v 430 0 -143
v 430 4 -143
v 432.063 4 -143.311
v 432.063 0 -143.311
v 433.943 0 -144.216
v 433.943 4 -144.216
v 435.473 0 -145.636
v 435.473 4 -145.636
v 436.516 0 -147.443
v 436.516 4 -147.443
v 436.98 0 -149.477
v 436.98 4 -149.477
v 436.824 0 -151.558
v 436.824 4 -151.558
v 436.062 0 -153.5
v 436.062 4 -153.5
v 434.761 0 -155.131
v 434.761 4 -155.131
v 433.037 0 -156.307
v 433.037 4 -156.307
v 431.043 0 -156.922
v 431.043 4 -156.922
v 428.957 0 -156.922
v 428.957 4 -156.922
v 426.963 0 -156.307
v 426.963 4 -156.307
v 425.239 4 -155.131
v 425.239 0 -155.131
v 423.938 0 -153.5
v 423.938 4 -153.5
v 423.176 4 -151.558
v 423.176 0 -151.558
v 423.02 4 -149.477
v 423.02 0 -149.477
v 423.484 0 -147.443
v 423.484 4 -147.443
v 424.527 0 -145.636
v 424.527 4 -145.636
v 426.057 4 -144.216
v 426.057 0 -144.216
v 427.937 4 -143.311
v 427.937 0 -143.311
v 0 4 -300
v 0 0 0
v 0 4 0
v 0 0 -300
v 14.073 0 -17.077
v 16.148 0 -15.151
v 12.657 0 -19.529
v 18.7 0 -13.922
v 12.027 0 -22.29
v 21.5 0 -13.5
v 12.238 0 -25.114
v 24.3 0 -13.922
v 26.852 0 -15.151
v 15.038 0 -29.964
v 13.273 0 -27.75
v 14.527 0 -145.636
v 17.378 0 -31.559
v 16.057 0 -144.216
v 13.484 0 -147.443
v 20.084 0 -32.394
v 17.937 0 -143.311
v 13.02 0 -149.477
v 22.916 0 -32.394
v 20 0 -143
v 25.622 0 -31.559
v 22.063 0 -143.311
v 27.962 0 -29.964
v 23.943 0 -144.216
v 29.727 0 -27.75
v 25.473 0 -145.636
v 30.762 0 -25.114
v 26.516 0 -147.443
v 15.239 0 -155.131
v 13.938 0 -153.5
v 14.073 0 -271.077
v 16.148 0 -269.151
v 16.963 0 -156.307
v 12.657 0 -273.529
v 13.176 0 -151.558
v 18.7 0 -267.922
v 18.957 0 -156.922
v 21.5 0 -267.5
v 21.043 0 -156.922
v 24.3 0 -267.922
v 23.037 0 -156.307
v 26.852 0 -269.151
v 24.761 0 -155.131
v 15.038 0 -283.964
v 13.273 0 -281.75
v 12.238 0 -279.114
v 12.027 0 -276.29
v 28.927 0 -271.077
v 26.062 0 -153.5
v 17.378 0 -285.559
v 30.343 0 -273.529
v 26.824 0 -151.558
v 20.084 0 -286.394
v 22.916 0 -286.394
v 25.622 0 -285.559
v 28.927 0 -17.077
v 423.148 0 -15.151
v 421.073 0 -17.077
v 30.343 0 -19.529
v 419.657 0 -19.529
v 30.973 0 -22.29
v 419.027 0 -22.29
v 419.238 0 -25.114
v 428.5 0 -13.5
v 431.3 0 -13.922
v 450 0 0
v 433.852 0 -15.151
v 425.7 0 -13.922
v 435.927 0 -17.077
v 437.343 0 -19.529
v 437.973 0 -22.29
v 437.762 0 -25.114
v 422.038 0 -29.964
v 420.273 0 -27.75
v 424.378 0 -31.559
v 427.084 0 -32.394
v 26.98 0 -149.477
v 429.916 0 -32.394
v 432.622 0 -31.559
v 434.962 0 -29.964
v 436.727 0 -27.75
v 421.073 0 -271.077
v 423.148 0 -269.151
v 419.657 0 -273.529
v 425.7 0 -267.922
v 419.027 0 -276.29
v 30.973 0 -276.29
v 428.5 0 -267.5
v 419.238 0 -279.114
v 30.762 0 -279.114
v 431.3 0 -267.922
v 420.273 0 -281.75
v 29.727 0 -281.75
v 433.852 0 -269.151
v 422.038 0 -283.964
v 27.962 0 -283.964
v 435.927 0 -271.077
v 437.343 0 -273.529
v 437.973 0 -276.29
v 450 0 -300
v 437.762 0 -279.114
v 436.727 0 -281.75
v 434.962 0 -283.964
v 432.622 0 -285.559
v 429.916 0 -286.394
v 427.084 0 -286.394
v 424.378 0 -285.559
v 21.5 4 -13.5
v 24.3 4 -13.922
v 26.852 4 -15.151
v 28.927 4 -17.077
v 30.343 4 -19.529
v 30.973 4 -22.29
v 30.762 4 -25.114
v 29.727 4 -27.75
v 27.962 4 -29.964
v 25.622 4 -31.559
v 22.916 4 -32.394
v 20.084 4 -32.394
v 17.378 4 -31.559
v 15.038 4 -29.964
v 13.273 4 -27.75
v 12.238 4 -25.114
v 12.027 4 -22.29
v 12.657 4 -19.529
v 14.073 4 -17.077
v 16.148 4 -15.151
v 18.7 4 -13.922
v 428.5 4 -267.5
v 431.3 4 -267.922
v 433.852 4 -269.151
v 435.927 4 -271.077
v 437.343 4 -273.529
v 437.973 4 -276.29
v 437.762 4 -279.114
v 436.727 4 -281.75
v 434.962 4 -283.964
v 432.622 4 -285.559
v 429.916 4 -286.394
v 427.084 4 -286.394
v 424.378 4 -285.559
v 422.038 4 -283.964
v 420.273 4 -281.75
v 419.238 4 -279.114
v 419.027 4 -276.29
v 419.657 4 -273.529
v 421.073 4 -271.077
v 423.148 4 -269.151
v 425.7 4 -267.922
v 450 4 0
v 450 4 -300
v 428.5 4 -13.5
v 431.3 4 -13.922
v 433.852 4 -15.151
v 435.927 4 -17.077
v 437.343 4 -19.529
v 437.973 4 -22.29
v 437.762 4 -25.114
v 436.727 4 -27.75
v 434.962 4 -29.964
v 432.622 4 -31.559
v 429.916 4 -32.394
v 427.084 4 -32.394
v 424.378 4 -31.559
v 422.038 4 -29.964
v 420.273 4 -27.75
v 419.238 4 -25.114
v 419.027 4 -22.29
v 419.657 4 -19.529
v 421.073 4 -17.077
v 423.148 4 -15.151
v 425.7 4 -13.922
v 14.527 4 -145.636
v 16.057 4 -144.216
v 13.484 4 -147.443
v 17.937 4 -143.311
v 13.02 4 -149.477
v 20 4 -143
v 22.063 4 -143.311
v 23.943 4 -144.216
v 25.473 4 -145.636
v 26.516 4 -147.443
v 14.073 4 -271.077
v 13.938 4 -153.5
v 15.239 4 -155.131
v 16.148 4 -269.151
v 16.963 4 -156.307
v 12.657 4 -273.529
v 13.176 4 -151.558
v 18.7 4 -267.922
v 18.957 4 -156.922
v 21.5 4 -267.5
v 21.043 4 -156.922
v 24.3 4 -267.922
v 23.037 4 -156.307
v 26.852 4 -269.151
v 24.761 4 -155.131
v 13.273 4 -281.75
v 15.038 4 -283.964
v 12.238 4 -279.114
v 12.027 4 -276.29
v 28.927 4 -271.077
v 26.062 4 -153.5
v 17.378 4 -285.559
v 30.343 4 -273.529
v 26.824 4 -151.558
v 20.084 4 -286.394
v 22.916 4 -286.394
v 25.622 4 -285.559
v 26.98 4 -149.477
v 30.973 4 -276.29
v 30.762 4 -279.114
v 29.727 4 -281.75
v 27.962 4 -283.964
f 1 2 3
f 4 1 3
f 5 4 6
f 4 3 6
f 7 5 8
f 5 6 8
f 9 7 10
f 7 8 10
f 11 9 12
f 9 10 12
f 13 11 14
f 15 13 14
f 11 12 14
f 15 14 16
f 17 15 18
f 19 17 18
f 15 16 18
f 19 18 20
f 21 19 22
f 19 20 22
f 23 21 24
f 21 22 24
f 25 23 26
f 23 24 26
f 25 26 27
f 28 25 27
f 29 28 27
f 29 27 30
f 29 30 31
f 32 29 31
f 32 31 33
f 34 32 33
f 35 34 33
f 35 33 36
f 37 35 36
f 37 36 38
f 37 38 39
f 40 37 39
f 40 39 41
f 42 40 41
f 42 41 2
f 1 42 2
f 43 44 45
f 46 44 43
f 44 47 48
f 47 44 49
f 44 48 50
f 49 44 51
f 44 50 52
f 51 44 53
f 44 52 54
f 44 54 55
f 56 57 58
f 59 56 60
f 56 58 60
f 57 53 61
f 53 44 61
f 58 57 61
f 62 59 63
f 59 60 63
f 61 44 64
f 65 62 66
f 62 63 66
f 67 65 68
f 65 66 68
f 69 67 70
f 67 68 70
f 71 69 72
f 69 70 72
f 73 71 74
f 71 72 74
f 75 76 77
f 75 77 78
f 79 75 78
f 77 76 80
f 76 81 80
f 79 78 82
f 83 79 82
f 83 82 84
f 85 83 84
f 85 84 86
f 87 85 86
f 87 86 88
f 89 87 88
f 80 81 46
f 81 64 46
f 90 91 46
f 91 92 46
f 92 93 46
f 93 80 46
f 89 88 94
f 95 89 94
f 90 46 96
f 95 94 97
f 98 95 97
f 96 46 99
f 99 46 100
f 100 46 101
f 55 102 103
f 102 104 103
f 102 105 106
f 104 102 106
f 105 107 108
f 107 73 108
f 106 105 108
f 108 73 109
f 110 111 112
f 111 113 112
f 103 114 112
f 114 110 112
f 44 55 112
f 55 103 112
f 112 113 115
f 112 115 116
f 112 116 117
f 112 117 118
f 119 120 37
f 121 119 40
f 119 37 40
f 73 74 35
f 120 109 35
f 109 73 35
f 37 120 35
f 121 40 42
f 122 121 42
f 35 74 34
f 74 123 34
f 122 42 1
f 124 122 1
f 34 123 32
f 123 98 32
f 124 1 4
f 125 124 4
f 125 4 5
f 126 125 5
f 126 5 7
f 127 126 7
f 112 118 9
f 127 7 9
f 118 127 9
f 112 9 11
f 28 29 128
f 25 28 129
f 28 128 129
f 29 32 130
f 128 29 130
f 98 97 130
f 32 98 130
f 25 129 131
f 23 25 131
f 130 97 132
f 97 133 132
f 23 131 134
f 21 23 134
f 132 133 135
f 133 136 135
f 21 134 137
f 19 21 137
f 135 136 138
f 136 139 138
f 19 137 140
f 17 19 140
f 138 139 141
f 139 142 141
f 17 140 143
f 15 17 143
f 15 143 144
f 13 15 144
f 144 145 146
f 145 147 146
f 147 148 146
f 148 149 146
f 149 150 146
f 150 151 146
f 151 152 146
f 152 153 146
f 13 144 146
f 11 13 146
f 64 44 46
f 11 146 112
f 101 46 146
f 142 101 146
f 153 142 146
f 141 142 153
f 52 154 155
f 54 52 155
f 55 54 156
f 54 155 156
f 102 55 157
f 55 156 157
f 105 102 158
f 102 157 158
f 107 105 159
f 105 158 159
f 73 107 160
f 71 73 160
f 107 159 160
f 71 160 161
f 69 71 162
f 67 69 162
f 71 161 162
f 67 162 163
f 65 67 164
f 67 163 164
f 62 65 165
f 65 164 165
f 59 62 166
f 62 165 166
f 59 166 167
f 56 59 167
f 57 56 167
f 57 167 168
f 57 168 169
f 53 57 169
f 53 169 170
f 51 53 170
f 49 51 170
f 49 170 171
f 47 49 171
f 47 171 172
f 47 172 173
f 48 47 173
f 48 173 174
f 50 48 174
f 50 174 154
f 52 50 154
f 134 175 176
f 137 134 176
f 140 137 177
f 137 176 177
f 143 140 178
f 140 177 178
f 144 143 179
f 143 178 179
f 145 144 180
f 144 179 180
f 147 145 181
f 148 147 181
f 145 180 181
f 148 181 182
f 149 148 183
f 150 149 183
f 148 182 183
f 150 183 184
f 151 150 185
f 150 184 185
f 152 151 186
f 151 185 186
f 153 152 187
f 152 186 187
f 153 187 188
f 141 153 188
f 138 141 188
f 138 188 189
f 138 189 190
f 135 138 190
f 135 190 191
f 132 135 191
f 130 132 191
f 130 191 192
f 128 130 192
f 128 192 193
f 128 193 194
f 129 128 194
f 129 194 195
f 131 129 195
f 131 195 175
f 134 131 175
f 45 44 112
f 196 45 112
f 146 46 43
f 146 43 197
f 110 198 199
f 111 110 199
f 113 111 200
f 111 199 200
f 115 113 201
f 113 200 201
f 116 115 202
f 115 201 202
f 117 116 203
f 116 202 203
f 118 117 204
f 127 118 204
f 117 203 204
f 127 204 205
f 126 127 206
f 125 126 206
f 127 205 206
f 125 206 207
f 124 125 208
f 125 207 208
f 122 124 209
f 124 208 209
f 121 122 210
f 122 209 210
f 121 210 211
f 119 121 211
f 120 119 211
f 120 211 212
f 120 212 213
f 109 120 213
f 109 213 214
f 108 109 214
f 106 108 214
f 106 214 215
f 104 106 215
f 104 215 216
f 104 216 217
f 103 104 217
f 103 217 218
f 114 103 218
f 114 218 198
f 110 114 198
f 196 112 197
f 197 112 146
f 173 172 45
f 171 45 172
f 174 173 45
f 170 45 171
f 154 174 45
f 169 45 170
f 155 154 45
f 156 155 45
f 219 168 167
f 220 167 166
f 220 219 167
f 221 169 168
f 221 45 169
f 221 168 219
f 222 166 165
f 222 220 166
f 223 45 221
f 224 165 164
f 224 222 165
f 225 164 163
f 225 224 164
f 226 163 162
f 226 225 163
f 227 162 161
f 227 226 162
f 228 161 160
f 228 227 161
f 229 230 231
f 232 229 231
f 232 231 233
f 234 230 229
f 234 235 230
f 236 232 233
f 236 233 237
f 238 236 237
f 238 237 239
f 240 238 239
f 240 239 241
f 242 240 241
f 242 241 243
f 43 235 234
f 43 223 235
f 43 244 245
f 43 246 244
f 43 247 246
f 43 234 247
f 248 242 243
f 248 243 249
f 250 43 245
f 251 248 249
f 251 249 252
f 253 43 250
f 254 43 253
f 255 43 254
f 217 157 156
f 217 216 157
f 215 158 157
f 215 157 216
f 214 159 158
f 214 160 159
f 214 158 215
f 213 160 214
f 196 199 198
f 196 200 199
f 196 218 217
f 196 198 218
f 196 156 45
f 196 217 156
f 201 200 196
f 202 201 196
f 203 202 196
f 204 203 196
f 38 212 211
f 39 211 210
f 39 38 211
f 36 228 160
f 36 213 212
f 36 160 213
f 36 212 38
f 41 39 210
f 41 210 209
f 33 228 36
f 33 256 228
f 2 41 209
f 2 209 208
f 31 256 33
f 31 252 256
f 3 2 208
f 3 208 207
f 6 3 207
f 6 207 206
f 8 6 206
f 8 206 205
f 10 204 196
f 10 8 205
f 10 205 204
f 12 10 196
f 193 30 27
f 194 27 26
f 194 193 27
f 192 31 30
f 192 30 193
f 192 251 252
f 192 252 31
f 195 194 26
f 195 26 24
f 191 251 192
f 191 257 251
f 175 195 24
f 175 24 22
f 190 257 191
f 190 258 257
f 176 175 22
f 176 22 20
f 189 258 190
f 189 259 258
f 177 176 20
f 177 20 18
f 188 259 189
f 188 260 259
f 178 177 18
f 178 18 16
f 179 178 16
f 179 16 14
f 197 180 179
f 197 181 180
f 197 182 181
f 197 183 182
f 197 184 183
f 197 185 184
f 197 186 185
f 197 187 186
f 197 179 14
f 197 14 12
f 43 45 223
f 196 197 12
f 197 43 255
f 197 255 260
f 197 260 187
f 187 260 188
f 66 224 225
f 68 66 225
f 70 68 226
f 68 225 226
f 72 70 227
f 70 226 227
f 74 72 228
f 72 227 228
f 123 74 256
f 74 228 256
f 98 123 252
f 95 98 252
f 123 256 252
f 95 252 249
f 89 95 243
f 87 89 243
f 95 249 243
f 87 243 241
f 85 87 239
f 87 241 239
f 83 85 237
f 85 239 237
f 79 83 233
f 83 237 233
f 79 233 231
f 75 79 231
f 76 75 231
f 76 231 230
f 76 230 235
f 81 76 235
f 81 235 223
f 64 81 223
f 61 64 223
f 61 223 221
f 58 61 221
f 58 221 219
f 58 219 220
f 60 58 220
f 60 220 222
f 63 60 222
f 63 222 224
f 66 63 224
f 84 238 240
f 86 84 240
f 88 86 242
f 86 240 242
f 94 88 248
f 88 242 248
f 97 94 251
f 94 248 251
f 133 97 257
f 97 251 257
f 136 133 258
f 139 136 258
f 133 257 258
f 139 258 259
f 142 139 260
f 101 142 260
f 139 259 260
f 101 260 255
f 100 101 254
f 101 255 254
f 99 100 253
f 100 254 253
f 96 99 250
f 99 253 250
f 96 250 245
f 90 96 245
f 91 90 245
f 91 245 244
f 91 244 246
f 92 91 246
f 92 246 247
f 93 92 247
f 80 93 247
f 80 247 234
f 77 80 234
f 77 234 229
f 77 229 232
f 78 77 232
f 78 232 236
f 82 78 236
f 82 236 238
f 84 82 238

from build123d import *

# Parameters (mm, degrees)
SKETCH_1_W          = 450
SKETCH_1_H          = 300
EXTRUDE_1_DEPTH     = 4
SKETCH_2_R          = 9.5
SKETCH_2_R_2        = 7
CUT_EXTRUDE_1_DEPTH = 10


with BuildPart() as part:
    # Эскиз1 → Бобышка-Вытянуть1 (new body)
    with BuildSketch(Plane(origin=(0, 0, 0), x_dir=(1, 0, 0), z_dir=(0, 1, 0))):
        with Locations((225, 150)):
            Rectangle(SKETCH_1_W, SKETCH_1_H)
    extrude(amount=EXTRUDE_1_DEPTH)

    # Эскиз2 → Вырез-Вытянуть1 (cut)
    with BuildSketch(Plane(origin=(0, 4, 0), x_dir=(1, 0, 0), z_dir=(0, 1, 0))):
        with Locations(Location((21.5, 23, 0), (0, 0, 270))):
            Circle(SKETCH_2_R)
        with Locations(Location((20, 150, 0), (0, 0, 270))):
            Circle(SKETCH_2_R_2)
        with Locations(Location((21.5, 277, 0), (0, 0, 270))):
            Circle(SKETCH_2_R)
        with Locations(Location((428.5, 23, 0), (0, 0, 270))):
            Circle(SKETCH_2_R)
        with Locations(Location((430, 150, 0), (0, 0, 270))):
            Circle(SKETCH_2_R_2)
        with Locations(Location((428.5, 277, 0), (0, 0, 270))):
            Circle(SKETCH_2_R)
    extrude(amount=-CUT_EXTRUDE_1_DEPTH, mode=Mode.SUBTRACT)


solid = part.part
